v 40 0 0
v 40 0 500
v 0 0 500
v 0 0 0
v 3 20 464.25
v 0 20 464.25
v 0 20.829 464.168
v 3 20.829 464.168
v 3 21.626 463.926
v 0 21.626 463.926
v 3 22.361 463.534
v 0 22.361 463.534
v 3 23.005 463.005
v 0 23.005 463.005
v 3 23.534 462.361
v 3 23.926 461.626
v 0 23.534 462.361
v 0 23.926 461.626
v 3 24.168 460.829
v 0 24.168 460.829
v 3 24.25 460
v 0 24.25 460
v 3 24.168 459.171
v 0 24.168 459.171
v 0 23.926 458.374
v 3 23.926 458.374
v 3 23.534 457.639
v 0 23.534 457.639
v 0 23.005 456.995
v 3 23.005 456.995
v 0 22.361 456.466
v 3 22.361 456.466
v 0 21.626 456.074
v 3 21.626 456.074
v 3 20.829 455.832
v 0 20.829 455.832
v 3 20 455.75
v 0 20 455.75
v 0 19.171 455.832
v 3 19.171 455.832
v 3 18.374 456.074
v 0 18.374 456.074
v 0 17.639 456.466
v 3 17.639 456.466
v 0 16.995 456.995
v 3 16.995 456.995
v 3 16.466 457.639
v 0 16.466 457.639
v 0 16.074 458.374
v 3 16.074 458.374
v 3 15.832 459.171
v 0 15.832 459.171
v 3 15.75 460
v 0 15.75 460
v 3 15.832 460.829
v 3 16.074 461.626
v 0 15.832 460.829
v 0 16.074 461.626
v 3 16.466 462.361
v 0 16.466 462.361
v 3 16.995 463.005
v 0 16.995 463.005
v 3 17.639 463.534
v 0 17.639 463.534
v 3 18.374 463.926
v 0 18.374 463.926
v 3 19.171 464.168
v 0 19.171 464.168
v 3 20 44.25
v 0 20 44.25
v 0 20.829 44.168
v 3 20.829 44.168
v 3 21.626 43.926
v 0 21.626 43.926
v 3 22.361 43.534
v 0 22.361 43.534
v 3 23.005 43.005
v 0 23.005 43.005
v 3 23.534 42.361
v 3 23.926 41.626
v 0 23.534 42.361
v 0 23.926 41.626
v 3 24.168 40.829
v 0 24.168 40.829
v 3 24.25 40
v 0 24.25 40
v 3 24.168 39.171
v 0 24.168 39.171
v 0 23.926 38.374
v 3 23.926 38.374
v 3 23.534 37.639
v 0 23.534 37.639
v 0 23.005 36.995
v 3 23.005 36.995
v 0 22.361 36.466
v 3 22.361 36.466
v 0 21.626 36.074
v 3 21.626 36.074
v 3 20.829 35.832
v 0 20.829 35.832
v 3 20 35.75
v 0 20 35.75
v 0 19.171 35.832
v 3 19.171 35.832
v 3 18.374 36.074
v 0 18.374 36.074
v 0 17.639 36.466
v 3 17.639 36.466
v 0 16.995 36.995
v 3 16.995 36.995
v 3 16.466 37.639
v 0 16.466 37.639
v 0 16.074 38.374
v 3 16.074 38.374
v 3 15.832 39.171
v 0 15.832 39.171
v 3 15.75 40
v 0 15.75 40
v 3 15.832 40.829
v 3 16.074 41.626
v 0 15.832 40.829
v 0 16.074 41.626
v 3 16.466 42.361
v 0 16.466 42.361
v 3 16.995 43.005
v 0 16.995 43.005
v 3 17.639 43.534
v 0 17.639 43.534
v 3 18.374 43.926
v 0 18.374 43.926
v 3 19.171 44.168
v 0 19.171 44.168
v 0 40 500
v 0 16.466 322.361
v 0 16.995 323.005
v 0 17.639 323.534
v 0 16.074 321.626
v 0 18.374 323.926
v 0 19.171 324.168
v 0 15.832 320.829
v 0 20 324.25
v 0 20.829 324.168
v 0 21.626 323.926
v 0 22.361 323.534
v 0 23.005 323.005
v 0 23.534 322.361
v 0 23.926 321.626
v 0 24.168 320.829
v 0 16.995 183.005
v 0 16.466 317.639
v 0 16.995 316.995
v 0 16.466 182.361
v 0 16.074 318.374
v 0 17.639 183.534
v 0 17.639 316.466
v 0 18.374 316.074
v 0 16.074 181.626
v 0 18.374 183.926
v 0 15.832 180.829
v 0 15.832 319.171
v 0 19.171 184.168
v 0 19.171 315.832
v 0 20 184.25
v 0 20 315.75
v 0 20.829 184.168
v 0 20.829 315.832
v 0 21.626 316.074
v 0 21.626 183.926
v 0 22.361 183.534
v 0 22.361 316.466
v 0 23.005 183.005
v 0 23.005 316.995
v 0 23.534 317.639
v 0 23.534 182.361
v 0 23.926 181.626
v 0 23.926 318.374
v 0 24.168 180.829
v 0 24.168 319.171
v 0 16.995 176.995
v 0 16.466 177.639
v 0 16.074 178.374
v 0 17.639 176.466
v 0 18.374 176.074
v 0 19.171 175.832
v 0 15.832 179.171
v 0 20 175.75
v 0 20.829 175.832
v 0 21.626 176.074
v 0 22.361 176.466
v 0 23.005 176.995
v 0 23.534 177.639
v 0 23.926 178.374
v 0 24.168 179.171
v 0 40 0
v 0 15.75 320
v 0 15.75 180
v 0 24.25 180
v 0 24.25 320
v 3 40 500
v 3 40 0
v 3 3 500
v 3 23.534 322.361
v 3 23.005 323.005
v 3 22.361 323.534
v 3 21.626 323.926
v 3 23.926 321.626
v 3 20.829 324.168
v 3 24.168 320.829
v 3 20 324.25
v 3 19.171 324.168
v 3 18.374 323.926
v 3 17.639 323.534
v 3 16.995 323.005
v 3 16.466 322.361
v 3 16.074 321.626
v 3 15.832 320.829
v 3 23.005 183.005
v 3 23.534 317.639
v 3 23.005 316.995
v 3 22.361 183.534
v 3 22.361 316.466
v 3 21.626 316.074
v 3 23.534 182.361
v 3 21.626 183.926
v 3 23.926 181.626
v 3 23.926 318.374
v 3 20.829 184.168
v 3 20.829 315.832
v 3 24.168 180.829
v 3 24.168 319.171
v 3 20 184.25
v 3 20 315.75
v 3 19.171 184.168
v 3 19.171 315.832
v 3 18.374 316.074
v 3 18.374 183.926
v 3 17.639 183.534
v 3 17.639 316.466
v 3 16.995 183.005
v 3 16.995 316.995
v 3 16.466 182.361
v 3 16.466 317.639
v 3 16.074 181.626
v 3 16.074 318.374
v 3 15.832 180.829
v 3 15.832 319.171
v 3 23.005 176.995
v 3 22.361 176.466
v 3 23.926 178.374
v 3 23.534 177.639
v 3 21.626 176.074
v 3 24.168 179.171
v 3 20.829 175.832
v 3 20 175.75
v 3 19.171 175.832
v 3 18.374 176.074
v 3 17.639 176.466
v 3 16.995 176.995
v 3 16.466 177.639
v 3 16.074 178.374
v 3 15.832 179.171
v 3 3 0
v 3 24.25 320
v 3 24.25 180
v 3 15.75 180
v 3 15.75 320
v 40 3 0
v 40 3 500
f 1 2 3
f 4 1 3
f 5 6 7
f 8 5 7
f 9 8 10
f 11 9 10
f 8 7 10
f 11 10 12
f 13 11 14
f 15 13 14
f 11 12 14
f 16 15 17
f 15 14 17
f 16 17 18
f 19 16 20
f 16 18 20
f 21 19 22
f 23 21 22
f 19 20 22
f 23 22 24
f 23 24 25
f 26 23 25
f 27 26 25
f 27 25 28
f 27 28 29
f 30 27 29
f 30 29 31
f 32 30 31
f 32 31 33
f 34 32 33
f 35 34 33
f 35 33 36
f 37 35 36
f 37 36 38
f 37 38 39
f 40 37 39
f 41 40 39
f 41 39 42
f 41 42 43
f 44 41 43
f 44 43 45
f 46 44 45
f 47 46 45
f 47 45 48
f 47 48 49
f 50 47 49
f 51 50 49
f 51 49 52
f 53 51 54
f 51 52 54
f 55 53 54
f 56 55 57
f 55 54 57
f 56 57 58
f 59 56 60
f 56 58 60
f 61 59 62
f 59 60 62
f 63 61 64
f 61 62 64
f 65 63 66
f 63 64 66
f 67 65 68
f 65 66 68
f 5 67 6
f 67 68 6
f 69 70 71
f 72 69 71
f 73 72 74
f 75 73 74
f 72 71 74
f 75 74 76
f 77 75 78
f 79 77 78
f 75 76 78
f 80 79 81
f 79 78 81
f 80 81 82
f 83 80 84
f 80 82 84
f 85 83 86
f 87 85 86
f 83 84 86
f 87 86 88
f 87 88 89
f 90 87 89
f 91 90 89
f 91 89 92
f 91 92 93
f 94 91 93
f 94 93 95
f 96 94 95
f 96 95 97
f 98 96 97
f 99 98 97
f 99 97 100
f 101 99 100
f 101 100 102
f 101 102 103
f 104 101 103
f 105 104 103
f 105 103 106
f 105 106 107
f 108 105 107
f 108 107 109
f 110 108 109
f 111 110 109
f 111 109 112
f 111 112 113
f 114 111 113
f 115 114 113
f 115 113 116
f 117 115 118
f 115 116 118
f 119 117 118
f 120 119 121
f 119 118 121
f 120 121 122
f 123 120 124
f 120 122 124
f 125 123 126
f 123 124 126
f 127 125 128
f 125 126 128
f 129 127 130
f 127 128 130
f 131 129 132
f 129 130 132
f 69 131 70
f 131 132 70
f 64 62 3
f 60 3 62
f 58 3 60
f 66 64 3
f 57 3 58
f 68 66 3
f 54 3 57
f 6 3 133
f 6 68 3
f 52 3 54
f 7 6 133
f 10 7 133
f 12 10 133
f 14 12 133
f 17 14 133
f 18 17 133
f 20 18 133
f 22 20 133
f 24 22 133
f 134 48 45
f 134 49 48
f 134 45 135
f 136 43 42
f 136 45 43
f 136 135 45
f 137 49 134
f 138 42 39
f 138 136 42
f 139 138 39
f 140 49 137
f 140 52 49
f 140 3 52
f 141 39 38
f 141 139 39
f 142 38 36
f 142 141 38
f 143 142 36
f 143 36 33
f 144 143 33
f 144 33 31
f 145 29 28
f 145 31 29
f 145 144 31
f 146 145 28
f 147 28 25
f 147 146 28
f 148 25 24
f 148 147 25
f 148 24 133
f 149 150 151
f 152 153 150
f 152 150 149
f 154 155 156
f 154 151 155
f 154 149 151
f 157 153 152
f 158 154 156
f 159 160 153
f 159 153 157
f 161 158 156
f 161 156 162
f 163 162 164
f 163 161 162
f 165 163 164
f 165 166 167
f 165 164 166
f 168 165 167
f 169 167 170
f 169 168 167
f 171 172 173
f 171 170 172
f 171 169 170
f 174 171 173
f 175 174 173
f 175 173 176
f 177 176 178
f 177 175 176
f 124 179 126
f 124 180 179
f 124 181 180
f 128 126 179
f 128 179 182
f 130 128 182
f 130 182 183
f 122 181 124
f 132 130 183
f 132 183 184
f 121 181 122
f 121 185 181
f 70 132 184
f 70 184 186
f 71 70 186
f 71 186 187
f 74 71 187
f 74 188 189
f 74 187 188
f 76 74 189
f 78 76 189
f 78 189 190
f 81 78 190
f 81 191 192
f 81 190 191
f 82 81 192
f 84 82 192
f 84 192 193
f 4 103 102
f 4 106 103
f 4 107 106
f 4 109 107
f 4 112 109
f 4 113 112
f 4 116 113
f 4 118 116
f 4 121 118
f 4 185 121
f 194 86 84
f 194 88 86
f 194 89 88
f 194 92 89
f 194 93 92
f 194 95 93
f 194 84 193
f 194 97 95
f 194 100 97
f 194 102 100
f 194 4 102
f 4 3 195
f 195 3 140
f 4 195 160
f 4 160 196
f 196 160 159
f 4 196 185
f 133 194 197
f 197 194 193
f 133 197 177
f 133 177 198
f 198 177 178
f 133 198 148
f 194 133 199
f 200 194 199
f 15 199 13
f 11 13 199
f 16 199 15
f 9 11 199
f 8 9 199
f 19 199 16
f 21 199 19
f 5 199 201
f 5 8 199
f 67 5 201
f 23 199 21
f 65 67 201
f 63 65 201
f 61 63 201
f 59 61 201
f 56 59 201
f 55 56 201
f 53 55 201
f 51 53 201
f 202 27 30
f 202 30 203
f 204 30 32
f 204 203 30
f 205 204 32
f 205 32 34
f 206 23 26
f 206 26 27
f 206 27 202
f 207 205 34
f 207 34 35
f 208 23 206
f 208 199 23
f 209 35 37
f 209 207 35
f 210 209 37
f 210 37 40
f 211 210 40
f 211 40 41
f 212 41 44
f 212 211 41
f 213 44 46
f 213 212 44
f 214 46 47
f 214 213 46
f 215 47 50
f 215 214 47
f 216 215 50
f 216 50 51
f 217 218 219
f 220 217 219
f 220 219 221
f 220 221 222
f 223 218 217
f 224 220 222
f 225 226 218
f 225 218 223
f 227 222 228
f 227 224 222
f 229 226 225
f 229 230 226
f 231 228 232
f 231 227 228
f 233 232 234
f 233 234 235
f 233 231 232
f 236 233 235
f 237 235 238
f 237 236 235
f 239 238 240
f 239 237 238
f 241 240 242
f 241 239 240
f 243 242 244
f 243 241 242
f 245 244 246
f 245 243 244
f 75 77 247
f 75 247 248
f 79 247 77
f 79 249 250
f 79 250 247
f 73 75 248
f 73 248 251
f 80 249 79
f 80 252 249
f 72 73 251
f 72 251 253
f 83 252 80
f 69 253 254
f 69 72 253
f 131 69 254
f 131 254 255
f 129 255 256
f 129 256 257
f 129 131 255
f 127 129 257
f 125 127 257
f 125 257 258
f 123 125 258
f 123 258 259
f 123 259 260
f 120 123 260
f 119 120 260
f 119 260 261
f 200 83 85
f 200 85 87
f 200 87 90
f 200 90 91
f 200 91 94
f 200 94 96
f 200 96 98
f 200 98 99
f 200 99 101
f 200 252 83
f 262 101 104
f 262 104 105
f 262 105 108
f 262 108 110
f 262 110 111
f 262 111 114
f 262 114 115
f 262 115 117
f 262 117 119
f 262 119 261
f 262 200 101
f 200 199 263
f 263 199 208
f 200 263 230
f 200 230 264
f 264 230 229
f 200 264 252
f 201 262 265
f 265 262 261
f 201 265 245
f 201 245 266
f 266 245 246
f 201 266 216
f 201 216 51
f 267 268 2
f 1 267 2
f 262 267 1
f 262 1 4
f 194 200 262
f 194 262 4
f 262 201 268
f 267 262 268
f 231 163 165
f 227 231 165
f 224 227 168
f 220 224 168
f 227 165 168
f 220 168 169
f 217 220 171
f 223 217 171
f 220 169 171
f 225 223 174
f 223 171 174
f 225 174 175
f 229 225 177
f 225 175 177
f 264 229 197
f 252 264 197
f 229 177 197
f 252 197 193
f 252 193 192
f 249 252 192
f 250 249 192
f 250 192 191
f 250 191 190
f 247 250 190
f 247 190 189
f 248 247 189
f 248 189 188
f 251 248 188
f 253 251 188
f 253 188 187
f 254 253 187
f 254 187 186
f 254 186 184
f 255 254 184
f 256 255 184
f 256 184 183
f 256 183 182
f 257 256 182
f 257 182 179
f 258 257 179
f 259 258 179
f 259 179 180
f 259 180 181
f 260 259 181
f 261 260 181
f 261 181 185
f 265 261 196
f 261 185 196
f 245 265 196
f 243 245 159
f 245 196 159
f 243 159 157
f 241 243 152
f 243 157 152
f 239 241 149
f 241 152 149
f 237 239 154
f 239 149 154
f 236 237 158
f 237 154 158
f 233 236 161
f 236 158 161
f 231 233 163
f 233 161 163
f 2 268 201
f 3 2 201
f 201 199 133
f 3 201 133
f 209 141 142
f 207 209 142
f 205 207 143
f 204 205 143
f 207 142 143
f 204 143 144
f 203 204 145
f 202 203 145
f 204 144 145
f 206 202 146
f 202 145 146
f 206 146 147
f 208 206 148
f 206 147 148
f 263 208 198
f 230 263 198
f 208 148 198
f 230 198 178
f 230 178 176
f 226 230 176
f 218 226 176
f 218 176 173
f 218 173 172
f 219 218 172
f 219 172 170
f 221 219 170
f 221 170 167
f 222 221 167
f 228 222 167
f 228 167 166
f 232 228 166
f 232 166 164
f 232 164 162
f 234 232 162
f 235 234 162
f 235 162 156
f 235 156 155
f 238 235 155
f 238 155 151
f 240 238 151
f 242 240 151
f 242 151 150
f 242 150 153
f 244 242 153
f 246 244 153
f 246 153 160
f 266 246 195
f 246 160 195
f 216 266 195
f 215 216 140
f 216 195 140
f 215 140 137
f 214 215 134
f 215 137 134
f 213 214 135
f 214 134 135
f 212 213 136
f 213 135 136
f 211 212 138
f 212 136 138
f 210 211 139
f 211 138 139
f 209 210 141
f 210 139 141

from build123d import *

# Parameters (mm, degrees)
Y_KSEKLIK_EKSTR_ZYON1_DEPTH = 500
IZIM2_R                     = 4.25
KES_EKSTR_ZYON1_DEPTH       = 10


with BuildPart() as part:
    # Çizim1 → Yükseklik-Ekstrüzyon1 (new body)
    with BuildSketch(Plane.XY):
        Polygon((0, 0), (0, 40), (3, 40), (3, 3), (40, 3), (40, 0), align=None)
    extrude(amount=Y_KSEKLIK_EKSTR_ZYON1_DEPTH)

    # Çizim2 → Kes-Ekstrüzyon1 (cut)
    with BuildSketch(Plane.ZY):
        with Locations((40, 20)):
            Circle(IZIM2_R)
        with Locations((180, 20)):
            Circle(IZIM2_R)
        with Locations((320, 20)):
            Circle(IZIM2_R)
        with Locations((460, 20)):
            Circle(IZIM2_R)
    extrude(amount=-KES_EKSTR_ZYON1_DEPTH, mode=Mode.SUBTRACT)


solid = part.part
